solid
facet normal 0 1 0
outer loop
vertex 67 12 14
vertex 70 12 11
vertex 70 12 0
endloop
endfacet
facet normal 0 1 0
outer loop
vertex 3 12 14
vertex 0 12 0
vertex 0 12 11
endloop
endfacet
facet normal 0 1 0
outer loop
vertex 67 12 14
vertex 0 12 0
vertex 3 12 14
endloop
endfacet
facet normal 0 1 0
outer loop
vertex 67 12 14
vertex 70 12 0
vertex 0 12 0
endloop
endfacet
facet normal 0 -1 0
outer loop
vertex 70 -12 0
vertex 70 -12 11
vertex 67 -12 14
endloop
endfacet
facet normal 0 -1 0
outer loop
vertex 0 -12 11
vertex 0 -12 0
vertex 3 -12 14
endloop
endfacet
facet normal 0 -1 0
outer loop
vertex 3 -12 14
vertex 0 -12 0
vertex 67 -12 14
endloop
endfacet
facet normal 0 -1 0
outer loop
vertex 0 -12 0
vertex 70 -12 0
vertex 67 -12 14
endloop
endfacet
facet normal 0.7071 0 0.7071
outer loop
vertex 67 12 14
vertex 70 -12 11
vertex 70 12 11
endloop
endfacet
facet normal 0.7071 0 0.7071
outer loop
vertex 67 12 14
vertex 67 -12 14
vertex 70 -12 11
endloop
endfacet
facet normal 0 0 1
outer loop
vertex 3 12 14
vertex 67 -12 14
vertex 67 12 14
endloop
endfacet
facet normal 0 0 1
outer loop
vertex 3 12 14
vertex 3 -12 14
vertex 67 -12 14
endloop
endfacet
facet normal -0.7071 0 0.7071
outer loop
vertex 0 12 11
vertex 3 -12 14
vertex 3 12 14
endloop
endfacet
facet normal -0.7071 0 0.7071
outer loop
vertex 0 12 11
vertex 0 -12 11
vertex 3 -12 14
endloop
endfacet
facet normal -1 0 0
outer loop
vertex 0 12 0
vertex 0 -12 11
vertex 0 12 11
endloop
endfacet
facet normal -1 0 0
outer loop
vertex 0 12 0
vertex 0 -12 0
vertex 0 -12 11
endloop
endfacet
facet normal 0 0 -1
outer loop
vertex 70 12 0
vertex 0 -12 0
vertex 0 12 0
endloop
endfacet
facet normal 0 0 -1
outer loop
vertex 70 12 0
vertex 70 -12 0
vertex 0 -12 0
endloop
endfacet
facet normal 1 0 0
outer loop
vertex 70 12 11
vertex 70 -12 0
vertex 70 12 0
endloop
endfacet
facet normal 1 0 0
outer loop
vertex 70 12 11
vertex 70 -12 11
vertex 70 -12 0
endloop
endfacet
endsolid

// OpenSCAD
// Beam experiment: build the elephant-foot hull FROM an already chamfered beam.
//
// The important construction order is:
//
//   1. Build the normal cs chamfer first.
//   2. Use that already-chamfered upper solid as one input to the ef hull.
//   3. Use an ef-inset bottom footprint as the other input.
//   4. hull() those two.
//
// This avoids feeding a square upper block into the ef hull.

/* [Demo] */
scene = "00_plain"; // [00_plain, 01_cs_inputs, 02_cs_result, 03_ef_inputs, 04_combined_result, 05_corner]

/* [Geometry] */
length = 70;
width = 24;
height = 14;
c = 3;
cs = 3;
ef = 1.2;

/* [Hidden] */
eps = 0.02;
reach = 12;
$fn = 48;

// ---------- Base beam ----------

module beam_profile_2d() {
    polygon([
        [0, 0],
        [length, 0],
        [length, height - c],
        [length - c, height],
        [c, height],
        [0, height - c]
    ]);
}

module beam() {
    rotate([90, 0, 0])
        linear_extrude(height = width, center = true)
            beam_profile_2d();
}

// ---------- cs hull ----------

// Extend below z=0 so cs changes the side/end edges but leaves the bottom
// contact perimeter available for the separate ef construction.
module cs_outline_2d() {
    polygon([
        [0, -reach],
        [length, -reach],
        [length, height - c],
        [length - c, height],
        [c, height],
        [0, height - c]
    ]);
}

// cs INPUT 1: full outline, narrower across Y.
module cs_input_inner() {
    rotate([90, 0, 0])
        linear_extrude(height = width - 2 * cs, center = true)
            cs_outline_2d();
}

// cs INPUT 2: inset outline, full width across Y.
module cs_input_outer() {
    rotate([90, 0, 0])
        linear_extrude(height = width, center = true)
            offset(delta = -cs)
                cs_outline_2d();
}

module cs_hull() {
    hull() {
        cs_input_inner();
        cs_input_outer();
    }
}

module cs_body() {
    intersection() {
        beam();
        cs_hull();
    }
}

// ---------- ef hull built from the ALREADY chamfered body ----------

// INPUT 1 for ef:
//
// First take the actual bottom footprint of cs_body(). That footprint already
// contains the cs chamfers at the end/side junctions. Only AFTER that do we
// inset it by ef.
//
// So the lower ef plate is NOT a rectangular plate anymore: both ef inputs
// already carry the cs geometry.
module cs_bottom_footprint_2d() {
    projection()
        intersection() {
            cs_body();
            translate([-reach, -width, -eps / 2])
                cube([length + 2 * reach, width * 2, eps]);
        }
}

module ef_input_bottom() {
    linear_extrude(height = eps)
        offset(delta = -ef)
            cs_bottom_footprint_2d();
}

// INPUT 2 for ef:
// NOT a square block.
//
// Start from cs_body(), which already contains the side-face chamfer and the
// upper end chamfers, and keep only the solid from z=ef upward.
// This is the upper object fed to the ef hull.
module ef_input_upper_chamfered() {
    intersection() {
        cs_body();
        translate([-reach, -width, ef])
            cube([length + 2 * reach, width * 2, height + reach]);
    }
}

// The final construction is now one hull between TWO already-cs-chamfered
// inputs: the lower cs footprint inset by ef, and the upper cs body.
module combined_hull() {
    hull() {
        ef_input_bottom();
        ef_input_upper_chamfered();
    }
}

// Keep the result within the original real beam.
// No separate cs_hull/ef_hull intersection is used after this point.
module combined_body() {
    intersection() {
        beam();
        combined_hull();
    }
}

module corner_crop() {
    translate([length - cs - ef - 4, width / 2 - cs - ef - 4, -1])
        cube([cs + ef + 8, cs + ef + 8, cs + ef + 5]);
}

// ---------- scenes ----------

if (scene == "00_plain") {
    color("SteelBlue")
        beam();
}

else if (scene == "01_cs_inputs") {
    color("SteelBlue", 0.36)
        cs_input_inner();
    color("DarkOrange", 0.36)
        cs_input_outer();
}

else if (scene == "02_cs_result") {
    color("SteelBlue")
        cs_body();
}

else if (scene == "03_ef_inputs") {
    // Blue: ef-inset bottom footprint.
    color("SteelBlue", 0.42)
        ef_input_bottom();

    // Orange: the ALREADY cs-chamfered upper solid.
    color("DarkOrange", 0.28)
        ef_input_upper_chamfered();
}

else if (scene == "04_combined_result") {
    color("SteelBlue")
        combined_body();
}

else {
    color("DarkOrange")
        intersection() {
            combined_body();
            corner_crop();
        }
}
